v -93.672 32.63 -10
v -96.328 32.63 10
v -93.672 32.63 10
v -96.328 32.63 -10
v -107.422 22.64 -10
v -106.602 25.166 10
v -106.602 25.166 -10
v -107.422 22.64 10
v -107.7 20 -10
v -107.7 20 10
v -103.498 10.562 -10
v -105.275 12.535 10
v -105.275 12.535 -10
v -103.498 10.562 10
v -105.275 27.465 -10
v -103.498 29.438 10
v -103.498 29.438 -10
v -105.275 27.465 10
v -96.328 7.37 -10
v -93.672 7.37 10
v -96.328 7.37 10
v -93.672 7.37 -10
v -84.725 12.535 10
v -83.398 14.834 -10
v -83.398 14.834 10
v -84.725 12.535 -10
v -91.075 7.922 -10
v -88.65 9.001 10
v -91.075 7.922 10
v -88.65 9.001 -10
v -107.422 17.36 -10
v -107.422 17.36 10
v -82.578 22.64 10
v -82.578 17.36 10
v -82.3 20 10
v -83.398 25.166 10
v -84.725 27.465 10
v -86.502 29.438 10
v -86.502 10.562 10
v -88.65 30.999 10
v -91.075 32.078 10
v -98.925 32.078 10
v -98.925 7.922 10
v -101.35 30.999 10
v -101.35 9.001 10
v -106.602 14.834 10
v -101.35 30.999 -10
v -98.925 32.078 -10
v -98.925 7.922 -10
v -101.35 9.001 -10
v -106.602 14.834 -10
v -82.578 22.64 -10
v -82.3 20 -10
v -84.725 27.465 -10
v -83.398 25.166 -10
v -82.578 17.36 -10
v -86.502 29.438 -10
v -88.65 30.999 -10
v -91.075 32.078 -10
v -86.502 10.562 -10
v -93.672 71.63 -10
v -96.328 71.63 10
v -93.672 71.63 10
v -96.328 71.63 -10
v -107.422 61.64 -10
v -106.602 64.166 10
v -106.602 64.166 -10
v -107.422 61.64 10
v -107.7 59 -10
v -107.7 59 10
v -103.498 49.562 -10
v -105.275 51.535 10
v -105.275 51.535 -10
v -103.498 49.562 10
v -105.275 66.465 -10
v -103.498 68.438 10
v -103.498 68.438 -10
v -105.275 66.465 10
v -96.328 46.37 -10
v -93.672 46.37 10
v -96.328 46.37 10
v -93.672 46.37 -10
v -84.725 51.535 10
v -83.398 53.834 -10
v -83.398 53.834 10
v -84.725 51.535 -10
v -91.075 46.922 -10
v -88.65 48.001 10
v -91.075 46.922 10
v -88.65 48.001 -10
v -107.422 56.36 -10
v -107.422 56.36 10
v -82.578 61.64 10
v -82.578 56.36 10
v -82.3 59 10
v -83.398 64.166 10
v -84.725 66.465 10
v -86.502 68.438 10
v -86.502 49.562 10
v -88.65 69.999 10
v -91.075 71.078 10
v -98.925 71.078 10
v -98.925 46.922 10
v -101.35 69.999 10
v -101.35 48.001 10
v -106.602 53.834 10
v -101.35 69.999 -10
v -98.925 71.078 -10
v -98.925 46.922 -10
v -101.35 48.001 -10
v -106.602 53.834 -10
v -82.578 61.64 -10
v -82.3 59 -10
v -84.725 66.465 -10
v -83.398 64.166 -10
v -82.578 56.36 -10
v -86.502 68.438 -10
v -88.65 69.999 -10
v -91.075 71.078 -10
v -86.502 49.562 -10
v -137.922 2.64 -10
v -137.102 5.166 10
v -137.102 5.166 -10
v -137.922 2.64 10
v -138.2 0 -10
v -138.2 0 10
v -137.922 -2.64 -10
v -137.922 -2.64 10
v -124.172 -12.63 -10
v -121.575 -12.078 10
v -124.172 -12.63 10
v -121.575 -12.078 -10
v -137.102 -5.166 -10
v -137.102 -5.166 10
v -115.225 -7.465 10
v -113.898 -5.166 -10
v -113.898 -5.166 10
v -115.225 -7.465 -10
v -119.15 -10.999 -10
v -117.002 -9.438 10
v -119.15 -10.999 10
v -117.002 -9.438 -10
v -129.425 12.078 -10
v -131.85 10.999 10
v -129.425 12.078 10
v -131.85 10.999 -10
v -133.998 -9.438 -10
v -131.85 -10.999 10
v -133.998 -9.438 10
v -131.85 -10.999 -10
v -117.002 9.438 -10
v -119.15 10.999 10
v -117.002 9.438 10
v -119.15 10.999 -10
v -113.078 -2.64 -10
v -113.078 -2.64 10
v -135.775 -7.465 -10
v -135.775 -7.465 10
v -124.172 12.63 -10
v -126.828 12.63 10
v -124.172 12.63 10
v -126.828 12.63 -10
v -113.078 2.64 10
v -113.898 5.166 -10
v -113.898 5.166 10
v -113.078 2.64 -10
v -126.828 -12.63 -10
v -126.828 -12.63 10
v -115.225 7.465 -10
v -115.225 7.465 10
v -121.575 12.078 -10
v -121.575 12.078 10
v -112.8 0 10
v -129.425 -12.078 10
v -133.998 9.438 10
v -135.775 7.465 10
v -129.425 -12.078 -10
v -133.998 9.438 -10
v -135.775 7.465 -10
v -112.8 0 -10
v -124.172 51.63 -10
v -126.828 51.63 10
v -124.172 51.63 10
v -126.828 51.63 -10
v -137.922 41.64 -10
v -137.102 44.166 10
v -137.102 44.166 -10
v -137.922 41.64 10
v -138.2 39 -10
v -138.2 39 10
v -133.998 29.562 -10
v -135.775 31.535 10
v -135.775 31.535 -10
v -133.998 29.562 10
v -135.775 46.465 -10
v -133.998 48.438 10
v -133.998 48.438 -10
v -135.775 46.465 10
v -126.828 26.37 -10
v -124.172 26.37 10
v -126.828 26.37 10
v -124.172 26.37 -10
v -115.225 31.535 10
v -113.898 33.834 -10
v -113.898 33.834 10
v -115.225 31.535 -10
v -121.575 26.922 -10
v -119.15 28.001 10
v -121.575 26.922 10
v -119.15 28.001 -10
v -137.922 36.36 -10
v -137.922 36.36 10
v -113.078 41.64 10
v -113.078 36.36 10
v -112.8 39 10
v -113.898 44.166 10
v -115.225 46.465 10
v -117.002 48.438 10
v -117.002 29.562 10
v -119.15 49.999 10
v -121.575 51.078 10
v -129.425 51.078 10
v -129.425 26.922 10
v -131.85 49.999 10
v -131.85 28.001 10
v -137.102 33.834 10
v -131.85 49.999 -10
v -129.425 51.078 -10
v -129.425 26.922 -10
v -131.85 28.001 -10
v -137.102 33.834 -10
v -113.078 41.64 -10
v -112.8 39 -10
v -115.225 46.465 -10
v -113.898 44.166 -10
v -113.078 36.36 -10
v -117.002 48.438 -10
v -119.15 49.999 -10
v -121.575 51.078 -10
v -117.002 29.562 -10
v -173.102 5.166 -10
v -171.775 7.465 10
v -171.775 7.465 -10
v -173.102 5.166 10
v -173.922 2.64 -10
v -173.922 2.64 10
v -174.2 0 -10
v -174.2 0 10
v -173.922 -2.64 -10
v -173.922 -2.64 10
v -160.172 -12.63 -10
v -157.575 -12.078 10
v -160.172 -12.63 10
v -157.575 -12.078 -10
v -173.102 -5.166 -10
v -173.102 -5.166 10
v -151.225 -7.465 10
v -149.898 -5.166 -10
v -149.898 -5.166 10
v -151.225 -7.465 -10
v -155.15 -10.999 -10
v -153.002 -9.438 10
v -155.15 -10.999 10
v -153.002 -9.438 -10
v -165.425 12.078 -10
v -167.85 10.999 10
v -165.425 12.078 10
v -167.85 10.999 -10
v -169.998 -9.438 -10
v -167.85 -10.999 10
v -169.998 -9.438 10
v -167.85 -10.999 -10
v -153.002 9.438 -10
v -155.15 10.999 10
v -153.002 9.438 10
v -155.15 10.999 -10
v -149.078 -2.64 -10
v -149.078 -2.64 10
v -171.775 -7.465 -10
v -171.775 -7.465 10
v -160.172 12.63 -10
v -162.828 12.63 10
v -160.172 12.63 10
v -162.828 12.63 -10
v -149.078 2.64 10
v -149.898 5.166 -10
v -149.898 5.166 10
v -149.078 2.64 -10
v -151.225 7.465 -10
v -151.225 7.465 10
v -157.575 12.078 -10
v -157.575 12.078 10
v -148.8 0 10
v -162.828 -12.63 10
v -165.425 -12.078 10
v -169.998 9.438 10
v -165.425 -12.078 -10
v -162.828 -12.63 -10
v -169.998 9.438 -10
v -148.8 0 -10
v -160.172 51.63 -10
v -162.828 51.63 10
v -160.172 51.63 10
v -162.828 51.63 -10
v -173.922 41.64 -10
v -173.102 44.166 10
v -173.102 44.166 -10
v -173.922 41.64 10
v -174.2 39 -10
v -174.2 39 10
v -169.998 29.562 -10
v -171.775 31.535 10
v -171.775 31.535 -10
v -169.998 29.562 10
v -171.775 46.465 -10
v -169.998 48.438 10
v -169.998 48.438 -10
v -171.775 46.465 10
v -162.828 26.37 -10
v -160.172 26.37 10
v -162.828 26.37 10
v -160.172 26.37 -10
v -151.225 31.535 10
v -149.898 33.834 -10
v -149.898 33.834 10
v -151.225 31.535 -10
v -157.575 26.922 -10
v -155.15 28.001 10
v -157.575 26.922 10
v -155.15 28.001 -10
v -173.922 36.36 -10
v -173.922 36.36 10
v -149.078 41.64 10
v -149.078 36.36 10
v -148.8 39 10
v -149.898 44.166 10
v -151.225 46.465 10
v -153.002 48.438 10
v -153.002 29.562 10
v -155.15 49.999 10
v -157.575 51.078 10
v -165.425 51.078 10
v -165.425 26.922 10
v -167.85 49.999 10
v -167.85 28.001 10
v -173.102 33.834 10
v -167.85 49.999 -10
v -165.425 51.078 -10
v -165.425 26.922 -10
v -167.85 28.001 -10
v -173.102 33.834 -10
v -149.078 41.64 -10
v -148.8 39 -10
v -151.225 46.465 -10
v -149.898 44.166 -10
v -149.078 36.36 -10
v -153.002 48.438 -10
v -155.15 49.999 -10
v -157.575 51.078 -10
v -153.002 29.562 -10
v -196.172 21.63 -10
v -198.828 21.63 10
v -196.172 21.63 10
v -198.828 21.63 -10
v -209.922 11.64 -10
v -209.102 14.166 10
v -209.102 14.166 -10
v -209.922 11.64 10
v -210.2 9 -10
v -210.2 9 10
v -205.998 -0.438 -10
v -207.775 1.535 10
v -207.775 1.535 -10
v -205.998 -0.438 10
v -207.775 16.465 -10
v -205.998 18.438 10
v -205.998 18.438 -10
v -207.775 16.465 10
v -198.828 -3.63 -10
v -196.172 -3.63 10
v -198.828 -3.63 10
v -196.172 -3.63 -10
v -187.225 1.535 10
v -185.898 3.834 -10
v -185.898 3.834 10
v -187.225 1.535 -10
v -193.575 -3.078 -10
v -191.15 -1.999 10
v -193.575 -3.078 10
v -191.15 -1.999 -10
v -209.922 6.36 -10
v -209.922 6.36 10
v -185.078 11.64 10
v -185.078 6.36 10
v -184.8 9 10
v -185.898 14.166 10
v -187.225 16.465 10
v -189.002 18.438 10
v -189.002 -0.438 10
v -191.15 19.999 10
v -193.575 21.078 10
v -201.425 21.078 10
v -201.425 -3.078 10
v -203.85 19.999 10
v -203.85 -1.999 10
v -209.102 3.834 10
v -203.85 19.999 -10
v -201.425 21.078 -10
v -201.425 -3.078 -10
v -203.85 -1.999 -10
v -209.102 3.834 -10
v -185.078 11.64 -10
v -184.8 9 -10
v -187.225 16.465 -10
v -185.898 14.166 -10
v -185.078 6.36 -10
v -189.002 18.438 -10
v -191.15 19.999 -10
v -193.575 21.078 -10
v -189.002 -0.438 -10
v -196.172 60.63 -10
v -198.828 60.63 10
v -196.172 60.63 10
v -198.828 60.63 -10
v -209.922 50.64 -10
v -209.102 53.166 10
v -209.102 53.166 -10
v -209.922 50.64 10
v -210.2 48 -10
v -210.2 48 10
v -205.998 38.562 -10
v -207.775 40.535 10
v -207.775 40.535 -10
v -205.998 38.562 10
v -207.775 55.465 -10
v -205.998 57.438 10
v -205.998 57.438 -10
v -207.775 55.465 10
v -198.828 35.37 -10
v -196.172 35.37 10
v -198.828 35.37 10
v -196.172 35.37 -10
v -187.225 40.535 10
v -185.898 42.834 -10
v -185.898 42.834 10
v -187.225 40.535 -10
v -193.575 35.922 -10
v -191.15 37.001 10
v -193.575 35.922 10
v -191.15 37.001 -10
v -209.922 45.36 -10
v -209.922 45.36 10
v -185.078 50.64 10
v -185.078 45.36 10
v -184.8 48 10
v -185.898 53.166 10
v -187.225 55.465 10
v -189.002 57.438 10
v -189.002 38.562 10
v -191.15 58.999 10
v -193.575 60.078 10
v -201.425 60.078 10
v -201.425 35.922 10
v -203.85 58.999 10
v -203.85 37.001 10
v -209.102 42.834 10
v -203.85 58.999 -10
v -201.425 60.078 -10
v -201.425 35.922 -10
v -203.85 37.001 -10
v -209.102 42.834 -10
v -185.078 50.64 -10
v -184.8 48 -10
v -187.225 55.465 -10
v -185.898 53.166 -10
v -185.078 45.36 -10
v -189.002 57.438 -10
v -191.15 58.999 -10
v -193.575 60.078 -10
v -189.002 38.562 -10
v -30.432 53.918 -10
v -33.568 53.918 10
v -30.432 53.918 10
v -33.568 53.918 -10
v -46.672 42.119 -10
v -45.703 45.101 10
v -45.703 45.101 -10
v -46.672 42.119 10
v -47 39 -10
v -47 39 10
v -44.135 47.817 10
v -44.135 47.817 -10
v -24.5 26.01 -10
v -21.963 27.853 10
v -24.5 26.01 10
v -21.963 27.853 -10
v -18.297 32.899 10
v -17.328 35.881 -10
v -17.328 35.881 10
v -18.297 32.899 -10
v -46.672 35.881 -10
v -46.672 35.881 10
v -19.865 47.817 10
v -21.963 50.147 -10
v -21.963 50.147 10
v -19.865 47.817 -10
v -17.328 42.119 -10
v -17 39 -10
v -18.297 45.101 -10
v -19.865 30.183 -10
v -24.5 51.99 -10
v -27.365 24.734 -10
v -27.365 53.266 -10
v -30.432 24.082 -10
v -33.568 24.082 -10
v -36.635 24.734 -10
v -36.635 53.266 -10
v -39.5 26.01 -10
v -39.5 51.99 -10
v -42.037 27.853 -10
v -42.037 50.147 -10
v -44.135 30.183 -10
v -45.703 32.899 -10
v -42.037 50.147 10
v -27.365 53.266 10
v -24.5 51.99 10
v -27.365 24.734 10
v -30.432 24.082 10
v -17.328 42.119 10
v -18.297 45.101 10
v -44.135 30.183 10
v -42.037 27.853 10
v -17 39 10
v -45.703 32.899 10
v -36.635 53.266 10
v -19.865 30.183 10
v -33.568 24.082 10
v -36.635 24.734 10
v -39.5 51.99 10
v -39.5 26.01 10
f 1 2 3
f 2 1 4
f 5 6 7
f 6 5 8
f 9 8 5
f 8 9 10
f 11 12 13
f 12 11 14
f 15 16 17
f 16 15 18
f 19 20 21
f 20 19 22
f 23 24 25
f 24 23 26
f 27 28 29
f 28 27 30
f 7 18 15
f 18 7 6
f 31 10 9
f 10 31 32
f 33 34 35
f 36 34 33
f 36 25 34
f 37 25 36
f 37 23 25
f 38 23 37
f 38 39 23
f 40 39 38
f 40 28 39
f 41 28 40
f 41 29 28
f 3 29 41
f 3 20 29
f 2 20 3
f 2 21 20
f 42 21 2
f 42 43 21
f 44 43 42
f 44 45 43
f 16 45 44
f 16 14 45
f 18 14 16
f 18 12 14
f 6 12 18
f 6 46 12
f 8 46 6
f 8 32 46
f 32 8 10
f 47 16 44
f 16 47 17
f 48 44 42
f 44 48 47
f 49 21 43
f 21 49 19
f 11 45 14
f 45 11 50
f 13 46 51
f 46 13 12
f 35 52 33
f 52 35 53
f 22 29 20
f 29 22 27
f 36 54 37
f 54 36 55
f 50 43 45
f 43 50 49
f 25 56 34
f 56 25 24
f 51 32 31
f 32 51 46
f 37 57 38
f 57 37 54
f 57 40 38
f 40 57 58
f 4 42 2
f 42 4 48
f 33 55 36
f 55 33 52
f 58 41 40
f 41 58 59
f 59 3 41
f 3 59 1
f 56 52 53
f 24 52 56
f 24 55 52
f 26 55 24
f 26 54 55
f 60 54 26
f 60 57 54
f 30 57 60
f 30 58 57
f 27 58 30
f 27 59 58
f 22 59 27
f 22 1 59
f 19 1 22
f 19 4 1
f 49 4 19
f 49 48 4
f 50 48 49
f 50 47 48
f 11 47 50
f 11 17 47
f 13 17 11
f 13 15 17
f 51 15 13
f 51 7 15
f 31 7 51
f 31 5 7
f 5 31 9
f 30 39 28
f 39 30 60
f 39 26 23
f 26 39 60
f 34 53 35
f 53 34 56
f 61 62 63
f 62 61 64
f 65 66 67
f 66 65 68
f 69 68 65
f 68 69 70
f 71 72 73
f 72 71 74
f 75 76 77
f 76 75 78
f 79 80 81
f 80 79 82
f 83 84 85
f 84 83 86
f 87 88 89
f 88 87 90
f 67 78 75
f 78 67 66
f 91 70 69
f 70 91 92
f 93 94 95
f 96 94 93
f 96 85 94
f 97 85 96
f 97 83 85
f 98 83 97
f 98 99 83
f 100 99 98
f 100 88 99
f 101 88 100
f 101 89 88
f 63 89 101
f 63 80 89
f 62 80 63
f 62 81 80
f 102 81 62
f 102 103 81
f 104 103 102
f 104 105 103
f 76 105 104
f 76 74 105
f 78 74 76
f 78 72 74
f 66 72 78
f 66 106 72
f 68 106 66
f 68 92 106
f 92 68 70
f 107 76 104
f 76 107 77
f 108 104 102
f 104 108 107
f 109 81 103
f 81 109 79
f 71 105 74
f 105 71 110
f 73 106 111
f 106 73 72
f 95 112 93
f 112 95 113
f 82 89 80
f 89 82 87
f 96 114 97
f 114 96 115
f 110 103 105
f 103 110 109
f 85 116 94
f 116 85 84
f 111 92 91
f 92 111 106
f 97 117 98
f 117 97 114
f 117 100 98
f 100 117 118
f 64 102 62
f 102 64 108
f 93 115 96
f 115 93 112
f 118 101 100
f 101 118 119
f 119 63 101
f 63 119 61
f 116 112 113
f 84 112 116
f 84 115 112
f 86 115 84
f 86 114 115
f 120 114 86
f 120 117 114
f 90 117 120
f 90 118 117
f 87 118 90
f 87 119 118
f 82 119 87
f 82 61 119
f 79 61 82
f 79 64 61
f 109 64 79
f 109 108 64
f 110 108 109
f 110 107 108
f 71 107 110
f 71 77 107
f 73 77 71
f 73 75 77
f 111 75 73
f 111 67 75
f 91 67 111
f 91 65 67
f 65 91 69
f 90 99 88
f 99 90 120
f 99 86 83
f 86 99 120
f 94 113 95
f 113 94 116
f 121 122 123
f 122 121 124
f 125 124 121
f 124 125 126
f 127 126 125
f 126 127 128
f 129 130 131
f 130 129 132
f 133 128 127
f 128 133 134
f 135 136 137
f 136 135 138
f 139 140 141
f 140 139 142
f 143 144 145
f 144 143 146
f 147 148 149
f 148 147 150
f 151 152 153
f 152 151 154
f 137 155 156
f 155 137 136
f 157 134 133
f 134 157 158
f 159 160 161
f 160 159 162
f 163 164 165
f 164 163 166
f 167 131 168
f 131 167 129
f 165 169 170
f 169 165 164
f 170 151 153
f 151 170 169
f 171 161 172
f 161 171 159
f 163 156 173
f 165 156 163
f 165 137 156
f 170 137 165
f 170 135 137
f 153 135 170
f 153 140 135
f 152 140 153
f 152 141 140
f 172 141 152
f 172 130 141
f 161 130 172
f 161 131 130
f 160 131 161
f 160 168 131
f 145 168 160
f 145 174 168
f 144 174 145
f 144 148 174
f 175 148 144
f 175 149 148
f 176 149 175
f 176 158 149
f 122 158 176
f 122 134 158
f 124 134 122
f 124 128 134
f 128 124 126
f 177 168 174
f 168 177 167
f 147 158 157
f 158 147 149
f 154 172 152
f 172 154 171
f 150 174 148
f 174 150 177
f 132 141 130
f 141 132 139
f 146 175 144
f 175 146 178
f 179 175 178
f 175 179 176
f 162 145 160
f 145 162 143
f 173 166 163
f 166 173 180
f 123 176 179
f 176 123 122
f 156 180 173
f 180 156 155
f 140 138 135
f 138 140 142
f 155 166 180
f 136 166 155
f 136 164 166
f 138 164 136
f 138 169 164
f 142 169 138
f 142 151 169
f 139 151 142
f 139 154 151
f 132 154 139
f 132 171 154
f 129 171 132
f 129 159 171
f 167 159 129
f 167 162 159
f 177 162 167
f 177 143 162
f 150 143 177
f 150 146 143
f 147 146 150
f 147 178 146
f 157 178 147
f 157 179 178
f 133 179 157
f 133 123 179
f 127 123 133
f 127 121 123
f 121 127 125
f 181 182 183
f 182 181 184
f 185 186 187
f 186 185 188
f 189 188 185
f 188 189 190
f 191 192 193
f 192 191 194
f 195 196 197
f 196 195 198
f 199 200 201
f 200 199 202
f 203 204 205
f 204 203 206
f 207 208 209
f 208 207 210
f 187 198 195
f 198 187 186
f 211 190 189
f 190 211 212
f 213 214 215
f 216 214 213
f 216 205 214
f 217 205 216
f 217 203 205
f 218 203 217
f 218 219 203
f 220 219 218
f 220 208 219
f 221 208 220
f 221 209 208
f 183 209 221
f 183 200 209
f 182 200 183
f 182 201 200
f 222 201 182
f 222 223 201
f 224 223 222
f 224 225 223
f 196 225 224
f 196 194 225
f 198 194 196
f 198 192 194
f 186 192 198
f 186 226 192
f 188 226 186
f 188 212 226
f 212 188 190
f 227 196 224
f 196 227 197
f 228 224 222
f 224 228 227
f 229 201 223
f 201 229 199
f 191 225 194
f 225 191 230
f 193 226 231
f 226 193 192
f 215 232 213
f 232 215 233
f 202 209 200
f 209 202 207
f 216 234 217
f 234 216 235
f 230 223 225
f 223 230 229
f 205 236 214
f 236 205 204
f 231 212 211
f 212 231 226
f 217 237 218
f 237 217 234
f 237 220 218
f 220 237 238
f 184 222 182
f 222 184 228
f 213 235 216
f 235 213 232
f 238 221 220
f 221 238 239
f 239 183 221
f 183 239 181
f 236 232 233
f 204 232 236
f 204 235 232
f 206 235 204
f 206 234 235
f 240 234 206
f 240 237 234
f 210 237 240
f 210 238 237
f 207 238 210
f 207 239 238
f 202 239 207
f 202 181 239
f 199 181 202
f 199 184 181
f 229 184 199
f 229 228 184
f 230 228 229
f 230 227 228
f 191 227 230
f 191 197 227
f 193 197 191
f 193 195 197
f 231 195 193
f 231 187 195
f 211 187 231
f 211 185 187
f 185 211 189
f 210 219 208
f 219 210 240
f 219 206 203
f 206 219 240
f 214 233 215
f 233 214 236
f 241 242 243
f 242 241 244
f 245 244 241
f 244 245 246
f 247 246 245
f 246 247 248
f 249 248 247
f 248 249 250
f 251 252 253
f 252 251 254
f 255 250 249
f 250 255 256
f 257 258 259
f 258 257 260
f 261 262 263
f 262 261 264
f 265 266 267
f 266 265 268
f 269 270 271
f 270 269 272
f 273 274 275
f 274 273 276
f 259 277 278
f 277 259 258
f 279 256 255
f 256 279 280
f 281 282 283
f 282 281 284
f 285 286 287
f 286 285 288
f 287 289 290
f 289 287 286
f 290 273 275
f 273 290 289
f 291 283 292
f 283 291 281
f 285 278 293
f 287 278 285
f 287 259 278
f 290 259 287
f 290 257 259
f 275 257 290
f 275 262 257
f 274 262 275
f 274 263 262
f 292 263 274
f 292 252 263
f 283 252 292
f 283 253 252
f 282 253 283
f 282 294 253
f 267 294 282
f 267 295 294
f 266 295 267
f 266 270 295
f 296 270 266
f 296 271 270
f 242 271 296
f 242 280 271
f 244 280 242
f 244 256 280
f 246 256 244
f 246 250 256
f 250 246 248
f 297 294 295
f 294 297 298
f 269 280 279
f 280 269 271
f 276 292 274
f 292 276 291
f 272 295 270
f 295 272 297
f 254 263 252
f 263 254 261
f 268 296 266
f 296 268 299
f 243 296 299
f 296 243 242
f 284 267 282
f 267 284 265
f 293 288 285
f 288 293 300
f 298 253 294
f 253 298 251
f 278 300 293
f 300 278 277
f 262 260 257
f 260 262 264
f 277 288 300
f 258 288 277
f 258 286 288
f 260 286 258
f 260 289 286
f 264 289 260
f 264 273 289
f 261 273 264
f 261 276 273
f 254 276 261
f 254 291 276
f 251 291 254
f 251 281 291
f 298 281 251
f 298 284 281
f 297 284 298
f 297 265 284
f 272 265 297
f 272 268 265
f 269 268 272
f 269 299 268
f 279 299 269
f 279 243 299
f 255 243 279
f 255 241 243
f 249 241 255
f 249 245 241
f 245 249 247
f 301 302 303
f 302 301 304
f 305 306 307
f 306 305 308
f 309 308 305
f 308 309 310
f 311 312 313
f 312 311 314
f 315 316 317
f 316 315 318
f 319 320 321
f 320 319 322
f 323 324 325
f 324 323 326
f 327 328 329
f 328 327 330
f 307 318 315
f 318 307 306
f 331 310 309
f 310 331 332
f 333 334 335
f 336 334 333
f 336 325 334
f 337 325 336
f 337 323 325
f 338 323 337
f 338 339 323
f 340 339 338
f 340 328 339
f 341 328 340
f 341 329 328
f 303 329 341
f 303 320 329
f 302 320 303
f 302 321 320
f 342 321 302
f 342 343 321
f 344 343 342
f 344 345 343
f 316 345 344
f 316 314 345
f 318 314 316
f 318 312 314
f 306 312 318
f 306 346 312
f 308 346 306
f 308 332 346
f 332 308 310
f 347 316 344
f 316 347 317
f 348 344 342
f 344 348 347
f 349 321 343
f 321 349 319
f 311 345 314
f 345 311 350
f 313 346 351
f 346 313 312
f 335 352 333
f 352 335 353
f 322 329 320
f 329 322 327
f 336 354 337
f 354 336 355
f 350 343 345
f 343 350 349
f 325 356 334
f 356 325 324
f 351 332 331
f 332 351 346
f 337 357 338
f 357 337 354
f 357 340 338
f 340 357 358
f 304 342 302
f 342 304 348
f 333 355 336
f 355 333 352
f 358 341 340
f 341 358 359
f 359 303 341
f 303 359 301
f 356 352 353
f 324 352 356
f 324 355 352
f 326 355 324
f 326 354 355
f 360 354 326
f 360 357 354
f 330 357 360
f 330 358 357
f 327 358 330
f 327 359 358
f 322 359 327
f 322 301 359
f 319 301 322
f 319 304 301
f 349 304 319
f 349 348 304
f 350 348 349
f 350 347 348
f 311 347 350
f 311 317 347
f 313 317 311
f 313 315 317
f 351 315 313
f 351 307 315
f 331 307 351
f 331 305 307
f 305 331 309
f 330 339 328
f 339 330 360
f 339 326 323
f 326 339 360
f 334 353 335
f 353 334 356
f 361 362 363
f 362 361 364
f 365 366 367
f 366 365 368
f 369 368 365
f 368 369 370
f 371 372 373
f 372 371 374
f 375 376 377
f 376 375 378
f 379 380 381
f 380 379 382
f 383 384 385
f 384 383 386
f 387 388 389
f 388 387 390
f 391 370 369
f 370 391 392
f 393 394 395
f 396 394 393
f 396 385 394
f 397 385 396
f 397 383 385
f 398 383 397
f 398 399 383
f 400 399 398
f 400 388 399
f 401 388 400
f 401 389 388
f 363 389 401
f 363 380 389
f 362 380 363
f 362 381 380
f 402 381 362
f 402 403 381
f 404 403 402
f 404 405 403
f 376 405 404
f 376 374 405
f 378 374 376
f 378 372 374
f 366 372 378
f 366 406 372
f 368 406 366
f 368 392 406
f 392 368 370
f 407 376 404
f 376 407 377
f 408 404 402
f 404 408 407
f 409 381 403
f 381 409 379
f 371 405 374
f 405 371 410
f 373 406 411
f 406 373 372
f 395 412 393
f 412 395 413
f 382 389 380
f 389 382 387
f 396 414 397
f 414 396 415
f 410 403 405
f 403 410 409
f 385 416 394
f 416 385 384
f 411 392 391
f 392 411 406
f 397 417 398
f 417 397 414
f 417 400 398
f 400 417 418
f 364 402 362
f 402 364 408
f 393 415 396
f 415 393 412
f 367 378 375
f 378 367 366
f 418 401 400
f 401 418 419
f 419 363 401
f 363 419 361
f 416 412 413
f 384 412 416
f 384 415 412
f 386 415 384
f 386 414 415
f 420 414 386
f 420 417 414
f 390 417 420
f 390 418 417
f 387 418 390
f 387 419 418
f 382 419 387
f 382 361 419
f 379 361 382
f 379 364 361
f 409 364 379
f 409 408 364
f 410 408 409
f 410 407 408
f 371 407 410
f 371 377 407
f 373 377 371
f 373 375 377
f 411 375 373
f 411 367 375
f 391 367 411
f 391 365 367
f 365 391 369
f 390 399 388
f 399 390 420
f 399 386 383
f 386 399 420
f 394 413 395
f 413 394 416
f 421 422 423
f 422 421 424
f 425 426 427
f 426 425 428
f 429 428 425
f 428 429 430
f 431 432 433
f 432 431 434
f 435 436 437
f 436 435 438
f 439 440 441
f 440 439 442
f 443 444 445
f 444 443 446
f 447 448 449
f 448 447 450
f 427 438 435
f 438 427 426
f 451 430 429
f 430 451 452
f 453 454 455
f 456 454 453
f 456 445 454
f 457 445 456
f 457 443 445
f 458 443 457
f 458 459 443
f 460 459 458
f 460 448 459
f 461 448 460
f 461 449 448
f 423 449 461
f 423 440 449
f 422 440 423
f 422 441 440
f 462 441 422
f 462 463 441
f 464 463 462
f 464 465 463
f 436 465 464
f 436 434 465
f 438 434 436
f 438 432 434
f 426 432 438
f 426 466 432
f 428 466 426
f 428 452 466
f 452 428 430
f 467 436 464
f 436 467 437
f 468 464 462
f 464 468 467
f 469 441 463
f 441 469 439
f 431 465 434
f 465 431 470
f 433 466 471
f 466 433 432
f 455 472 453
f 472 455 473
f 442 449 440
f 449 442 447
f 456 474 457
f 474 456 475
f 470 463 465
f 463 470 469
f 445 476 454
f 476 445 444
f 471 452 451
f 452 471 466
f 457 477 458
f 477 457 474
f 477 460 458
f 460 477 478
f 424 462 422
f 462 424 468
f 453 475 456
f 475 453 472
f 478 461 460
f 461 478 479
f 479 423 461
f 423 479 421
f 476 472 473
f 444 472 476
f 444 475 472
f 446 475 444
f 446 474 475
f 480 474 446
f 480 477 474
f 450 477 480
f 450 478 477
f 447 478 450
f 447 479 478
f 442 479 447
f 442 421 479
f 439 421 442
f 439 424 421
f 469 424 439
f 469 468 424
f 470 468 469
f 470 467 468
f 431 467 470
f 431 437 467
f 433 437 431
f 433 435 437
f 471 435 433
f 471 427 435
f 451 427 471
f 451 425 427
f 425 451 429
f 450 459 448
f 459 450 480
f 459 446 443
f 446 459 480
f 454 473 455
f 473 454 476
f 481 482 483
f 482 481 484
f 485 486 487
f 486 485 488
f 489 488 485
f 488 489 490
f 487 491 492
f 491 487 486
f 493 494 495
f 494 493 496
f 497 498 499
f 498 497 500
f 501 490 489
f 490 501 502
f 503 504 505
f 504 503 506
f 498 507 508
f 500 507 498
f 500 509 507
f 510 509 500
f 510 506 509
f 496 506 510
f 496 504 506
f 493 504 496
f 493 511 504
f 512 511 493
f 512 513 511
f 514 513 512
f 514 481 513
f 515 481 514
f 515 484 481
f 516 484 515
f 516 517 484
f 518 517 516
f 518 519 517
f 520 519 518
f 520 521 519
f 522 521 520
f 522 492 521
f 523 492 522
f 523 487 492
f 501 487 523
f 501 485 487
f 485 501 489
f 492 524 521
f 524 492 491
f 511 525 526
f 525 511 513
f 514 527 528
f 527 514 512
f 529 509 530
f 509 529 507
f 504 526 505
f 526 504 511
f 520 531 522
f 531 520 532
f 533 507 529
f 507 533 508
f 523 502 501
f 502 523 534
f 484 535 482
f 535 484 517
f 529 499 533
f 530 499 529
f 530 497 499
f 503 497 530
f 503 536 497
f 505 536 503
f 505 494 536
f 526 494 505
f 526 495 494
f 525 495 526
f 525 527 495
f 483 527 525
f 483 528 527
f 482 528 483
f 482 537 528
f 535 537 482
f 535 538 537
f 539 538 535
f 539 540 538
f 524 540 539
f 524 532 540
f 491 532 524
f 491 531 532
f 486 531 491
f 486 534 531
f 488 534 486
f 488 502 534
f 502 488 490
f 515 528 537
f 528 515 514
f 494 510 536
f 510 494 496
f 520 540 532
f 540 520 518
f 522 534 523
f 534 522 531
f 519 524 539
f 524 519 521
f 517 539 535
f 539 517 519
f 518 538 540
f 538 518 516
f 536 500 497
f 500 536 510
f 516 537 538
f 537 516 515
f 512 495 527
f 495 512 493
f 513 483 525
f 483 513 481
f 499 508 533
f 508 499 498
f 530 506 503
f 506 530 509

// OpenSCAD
// Copyright (c) 2017  Timm Murray
// All rights reserved.
// 
// Redistribution and use in source and binary forms, with or without 
// modification, are permitted provided that the following conditions are met:
// 
//     * Redistributions of source code must retain the above copyright notice, 
//       this list of conditions and the following disclaimer.
//     * Redistributions in binary form must reproduce the above copyright 
//       notice, this list of conditions and the following disclaimer in the 
//       documentation and/or other materials provided with the distribution.
// 
// THIS SOFTWARE IS PROVIDED BY THE COPYRIGHT HOLDERS AND CONTRIBUTORS "AS IS" 
// AND ANY EXPRESS OR IMPLIED WARRANTIES, INCLUDING, BUT NOT LIMITED TO, THE 
// IMPLIED WARRANTIES OF MERCHANTABILITY AND FITNESS FOR A PARTICULAR PURPOSE 
// ARE DISCLAIMED. IN NO EVENT SHALL THE COPYRIGHT HOLDER OR CONTRIBUTORS BE 
// LIABLE FOR ANY DIRECT, INDIRECT, INCIDENTAL, SPECIAL, EXEMPLARY, OR 
// CONSEQUENTIAL DAMAGES (INCLUDING, BUT NOT LIMITED TO, PROCUREMENT OF 
// SUBSTITUTE GOODS OR SERVICES; LOSS OF USE, DATA, OR PROFITS; OR BUSINESS 
// INTERRUPTION) HOWEVER CAUSED AND ON ANY THEORY OF LIABILITY, WHETHER IN 
// CONTRACT, STRICT LIABILITY, OR TORT (INCLUDING NEGLIGENCE OR OTHERWISE) 
// ARISING IN ANY WAY OUT OF THE USE OF THIS SOFTWARE, EVEN IF ADVISED OF THE 
// POSSIBILITY OF SUCH DAMAGE.
//
THICKNESS = 20;
JOYSTICK_HOLE_DIAMETER = 30;
BTN_HOLE_DIAMETER = 25.4;

// Layout from:
// http://www.slagcoin.com/joystick/layout/sega2_m.png
//
// Tends to assume num_btns is an even number, and is between 4 and 8
// (inclusive)
module joystick( num_btns )
{
    mirror() {
        // Joystick hole
        translate(v = [
            (197.5 - 36 - 36 - 30.5 - 63),
            (9 + 11 + 19),
            0
        ]) {
            cylinder(
                h = THICKNESS,
                d = JOYSTICK_HOLE_DIAMETER,
                center = true
            );
        }

        // Left buttons
        translate(v = [ (197.5 - 36 - 36 - 30.5), 0, 0 ]) {
            translate( v = [ 0, (9 + 11), 0 ] )
                cylinder(
                    h = THICKNESS,
                    d = BTN_HOLE_DIAMETER,
                    center = true
                );
            translate( v = [ 0, (9 + 11 + 19 + 9 + 11), 0 ])
                cylinder(
                    h = THICKNESS,
                    d = BTN_HOLE_DIAMETER,
                    center = true
                );
        }
        // Middle-left buttons
        translate(v = [ (197.5 - 36 - 36), 0, 0 ]) {
            translate( v = [ 0, 0, 0 ] )
                cylinder(
                    h = THICKNESS,
                    d = BTN_HOLE_DIAMETER,
                    center = true
                );
            translate( v = [ 0, (9 + 11 + 19), 0 ])
                cylinder(
                    h = THICKNESS,
                    d = BTN_HOLE_DIAMETER,
                    center = true
                );
        }

        if( num_btns > 4 ) {
            // Middle-right buttons
            translate(v = [ (197.5 - 36), 0, 0 ]) {
                translate( v = [ 0, 0, 0 ] )
                    cylinder(
                        h = THICKNESS,
                        d = BTN_HOLE_DIAMETER,
                        center = true
                    );
                translate( v = [ 0, (9 + 11 + 19), 0 ])
                    cylinder(
                        h = THICKNESS,
                        d = BTN_HOLE_DIAMETER,
                        center = true
                    );
            }
        }

        if( num_btns > 6 ) {
            // Right buttons
            translate(v = [ 197.5, 0, 0 ]) {
                translate( v = [ 0, 9, 0 ] )
                    cylinder(
                        h = THICKNESS,
                        d = BTN_HOLE_DIAMETER,
                        center = true
                    );
                translate( v = [ 0, (9 + 11 + 19 + 9), 0 ])
                    cylinder(
                        h = THICKNESS,
                        d = BTN_HOLE_DIAMETER,
                        center = true
                    );
            }
        }
    }
}


joystick( 8 );
